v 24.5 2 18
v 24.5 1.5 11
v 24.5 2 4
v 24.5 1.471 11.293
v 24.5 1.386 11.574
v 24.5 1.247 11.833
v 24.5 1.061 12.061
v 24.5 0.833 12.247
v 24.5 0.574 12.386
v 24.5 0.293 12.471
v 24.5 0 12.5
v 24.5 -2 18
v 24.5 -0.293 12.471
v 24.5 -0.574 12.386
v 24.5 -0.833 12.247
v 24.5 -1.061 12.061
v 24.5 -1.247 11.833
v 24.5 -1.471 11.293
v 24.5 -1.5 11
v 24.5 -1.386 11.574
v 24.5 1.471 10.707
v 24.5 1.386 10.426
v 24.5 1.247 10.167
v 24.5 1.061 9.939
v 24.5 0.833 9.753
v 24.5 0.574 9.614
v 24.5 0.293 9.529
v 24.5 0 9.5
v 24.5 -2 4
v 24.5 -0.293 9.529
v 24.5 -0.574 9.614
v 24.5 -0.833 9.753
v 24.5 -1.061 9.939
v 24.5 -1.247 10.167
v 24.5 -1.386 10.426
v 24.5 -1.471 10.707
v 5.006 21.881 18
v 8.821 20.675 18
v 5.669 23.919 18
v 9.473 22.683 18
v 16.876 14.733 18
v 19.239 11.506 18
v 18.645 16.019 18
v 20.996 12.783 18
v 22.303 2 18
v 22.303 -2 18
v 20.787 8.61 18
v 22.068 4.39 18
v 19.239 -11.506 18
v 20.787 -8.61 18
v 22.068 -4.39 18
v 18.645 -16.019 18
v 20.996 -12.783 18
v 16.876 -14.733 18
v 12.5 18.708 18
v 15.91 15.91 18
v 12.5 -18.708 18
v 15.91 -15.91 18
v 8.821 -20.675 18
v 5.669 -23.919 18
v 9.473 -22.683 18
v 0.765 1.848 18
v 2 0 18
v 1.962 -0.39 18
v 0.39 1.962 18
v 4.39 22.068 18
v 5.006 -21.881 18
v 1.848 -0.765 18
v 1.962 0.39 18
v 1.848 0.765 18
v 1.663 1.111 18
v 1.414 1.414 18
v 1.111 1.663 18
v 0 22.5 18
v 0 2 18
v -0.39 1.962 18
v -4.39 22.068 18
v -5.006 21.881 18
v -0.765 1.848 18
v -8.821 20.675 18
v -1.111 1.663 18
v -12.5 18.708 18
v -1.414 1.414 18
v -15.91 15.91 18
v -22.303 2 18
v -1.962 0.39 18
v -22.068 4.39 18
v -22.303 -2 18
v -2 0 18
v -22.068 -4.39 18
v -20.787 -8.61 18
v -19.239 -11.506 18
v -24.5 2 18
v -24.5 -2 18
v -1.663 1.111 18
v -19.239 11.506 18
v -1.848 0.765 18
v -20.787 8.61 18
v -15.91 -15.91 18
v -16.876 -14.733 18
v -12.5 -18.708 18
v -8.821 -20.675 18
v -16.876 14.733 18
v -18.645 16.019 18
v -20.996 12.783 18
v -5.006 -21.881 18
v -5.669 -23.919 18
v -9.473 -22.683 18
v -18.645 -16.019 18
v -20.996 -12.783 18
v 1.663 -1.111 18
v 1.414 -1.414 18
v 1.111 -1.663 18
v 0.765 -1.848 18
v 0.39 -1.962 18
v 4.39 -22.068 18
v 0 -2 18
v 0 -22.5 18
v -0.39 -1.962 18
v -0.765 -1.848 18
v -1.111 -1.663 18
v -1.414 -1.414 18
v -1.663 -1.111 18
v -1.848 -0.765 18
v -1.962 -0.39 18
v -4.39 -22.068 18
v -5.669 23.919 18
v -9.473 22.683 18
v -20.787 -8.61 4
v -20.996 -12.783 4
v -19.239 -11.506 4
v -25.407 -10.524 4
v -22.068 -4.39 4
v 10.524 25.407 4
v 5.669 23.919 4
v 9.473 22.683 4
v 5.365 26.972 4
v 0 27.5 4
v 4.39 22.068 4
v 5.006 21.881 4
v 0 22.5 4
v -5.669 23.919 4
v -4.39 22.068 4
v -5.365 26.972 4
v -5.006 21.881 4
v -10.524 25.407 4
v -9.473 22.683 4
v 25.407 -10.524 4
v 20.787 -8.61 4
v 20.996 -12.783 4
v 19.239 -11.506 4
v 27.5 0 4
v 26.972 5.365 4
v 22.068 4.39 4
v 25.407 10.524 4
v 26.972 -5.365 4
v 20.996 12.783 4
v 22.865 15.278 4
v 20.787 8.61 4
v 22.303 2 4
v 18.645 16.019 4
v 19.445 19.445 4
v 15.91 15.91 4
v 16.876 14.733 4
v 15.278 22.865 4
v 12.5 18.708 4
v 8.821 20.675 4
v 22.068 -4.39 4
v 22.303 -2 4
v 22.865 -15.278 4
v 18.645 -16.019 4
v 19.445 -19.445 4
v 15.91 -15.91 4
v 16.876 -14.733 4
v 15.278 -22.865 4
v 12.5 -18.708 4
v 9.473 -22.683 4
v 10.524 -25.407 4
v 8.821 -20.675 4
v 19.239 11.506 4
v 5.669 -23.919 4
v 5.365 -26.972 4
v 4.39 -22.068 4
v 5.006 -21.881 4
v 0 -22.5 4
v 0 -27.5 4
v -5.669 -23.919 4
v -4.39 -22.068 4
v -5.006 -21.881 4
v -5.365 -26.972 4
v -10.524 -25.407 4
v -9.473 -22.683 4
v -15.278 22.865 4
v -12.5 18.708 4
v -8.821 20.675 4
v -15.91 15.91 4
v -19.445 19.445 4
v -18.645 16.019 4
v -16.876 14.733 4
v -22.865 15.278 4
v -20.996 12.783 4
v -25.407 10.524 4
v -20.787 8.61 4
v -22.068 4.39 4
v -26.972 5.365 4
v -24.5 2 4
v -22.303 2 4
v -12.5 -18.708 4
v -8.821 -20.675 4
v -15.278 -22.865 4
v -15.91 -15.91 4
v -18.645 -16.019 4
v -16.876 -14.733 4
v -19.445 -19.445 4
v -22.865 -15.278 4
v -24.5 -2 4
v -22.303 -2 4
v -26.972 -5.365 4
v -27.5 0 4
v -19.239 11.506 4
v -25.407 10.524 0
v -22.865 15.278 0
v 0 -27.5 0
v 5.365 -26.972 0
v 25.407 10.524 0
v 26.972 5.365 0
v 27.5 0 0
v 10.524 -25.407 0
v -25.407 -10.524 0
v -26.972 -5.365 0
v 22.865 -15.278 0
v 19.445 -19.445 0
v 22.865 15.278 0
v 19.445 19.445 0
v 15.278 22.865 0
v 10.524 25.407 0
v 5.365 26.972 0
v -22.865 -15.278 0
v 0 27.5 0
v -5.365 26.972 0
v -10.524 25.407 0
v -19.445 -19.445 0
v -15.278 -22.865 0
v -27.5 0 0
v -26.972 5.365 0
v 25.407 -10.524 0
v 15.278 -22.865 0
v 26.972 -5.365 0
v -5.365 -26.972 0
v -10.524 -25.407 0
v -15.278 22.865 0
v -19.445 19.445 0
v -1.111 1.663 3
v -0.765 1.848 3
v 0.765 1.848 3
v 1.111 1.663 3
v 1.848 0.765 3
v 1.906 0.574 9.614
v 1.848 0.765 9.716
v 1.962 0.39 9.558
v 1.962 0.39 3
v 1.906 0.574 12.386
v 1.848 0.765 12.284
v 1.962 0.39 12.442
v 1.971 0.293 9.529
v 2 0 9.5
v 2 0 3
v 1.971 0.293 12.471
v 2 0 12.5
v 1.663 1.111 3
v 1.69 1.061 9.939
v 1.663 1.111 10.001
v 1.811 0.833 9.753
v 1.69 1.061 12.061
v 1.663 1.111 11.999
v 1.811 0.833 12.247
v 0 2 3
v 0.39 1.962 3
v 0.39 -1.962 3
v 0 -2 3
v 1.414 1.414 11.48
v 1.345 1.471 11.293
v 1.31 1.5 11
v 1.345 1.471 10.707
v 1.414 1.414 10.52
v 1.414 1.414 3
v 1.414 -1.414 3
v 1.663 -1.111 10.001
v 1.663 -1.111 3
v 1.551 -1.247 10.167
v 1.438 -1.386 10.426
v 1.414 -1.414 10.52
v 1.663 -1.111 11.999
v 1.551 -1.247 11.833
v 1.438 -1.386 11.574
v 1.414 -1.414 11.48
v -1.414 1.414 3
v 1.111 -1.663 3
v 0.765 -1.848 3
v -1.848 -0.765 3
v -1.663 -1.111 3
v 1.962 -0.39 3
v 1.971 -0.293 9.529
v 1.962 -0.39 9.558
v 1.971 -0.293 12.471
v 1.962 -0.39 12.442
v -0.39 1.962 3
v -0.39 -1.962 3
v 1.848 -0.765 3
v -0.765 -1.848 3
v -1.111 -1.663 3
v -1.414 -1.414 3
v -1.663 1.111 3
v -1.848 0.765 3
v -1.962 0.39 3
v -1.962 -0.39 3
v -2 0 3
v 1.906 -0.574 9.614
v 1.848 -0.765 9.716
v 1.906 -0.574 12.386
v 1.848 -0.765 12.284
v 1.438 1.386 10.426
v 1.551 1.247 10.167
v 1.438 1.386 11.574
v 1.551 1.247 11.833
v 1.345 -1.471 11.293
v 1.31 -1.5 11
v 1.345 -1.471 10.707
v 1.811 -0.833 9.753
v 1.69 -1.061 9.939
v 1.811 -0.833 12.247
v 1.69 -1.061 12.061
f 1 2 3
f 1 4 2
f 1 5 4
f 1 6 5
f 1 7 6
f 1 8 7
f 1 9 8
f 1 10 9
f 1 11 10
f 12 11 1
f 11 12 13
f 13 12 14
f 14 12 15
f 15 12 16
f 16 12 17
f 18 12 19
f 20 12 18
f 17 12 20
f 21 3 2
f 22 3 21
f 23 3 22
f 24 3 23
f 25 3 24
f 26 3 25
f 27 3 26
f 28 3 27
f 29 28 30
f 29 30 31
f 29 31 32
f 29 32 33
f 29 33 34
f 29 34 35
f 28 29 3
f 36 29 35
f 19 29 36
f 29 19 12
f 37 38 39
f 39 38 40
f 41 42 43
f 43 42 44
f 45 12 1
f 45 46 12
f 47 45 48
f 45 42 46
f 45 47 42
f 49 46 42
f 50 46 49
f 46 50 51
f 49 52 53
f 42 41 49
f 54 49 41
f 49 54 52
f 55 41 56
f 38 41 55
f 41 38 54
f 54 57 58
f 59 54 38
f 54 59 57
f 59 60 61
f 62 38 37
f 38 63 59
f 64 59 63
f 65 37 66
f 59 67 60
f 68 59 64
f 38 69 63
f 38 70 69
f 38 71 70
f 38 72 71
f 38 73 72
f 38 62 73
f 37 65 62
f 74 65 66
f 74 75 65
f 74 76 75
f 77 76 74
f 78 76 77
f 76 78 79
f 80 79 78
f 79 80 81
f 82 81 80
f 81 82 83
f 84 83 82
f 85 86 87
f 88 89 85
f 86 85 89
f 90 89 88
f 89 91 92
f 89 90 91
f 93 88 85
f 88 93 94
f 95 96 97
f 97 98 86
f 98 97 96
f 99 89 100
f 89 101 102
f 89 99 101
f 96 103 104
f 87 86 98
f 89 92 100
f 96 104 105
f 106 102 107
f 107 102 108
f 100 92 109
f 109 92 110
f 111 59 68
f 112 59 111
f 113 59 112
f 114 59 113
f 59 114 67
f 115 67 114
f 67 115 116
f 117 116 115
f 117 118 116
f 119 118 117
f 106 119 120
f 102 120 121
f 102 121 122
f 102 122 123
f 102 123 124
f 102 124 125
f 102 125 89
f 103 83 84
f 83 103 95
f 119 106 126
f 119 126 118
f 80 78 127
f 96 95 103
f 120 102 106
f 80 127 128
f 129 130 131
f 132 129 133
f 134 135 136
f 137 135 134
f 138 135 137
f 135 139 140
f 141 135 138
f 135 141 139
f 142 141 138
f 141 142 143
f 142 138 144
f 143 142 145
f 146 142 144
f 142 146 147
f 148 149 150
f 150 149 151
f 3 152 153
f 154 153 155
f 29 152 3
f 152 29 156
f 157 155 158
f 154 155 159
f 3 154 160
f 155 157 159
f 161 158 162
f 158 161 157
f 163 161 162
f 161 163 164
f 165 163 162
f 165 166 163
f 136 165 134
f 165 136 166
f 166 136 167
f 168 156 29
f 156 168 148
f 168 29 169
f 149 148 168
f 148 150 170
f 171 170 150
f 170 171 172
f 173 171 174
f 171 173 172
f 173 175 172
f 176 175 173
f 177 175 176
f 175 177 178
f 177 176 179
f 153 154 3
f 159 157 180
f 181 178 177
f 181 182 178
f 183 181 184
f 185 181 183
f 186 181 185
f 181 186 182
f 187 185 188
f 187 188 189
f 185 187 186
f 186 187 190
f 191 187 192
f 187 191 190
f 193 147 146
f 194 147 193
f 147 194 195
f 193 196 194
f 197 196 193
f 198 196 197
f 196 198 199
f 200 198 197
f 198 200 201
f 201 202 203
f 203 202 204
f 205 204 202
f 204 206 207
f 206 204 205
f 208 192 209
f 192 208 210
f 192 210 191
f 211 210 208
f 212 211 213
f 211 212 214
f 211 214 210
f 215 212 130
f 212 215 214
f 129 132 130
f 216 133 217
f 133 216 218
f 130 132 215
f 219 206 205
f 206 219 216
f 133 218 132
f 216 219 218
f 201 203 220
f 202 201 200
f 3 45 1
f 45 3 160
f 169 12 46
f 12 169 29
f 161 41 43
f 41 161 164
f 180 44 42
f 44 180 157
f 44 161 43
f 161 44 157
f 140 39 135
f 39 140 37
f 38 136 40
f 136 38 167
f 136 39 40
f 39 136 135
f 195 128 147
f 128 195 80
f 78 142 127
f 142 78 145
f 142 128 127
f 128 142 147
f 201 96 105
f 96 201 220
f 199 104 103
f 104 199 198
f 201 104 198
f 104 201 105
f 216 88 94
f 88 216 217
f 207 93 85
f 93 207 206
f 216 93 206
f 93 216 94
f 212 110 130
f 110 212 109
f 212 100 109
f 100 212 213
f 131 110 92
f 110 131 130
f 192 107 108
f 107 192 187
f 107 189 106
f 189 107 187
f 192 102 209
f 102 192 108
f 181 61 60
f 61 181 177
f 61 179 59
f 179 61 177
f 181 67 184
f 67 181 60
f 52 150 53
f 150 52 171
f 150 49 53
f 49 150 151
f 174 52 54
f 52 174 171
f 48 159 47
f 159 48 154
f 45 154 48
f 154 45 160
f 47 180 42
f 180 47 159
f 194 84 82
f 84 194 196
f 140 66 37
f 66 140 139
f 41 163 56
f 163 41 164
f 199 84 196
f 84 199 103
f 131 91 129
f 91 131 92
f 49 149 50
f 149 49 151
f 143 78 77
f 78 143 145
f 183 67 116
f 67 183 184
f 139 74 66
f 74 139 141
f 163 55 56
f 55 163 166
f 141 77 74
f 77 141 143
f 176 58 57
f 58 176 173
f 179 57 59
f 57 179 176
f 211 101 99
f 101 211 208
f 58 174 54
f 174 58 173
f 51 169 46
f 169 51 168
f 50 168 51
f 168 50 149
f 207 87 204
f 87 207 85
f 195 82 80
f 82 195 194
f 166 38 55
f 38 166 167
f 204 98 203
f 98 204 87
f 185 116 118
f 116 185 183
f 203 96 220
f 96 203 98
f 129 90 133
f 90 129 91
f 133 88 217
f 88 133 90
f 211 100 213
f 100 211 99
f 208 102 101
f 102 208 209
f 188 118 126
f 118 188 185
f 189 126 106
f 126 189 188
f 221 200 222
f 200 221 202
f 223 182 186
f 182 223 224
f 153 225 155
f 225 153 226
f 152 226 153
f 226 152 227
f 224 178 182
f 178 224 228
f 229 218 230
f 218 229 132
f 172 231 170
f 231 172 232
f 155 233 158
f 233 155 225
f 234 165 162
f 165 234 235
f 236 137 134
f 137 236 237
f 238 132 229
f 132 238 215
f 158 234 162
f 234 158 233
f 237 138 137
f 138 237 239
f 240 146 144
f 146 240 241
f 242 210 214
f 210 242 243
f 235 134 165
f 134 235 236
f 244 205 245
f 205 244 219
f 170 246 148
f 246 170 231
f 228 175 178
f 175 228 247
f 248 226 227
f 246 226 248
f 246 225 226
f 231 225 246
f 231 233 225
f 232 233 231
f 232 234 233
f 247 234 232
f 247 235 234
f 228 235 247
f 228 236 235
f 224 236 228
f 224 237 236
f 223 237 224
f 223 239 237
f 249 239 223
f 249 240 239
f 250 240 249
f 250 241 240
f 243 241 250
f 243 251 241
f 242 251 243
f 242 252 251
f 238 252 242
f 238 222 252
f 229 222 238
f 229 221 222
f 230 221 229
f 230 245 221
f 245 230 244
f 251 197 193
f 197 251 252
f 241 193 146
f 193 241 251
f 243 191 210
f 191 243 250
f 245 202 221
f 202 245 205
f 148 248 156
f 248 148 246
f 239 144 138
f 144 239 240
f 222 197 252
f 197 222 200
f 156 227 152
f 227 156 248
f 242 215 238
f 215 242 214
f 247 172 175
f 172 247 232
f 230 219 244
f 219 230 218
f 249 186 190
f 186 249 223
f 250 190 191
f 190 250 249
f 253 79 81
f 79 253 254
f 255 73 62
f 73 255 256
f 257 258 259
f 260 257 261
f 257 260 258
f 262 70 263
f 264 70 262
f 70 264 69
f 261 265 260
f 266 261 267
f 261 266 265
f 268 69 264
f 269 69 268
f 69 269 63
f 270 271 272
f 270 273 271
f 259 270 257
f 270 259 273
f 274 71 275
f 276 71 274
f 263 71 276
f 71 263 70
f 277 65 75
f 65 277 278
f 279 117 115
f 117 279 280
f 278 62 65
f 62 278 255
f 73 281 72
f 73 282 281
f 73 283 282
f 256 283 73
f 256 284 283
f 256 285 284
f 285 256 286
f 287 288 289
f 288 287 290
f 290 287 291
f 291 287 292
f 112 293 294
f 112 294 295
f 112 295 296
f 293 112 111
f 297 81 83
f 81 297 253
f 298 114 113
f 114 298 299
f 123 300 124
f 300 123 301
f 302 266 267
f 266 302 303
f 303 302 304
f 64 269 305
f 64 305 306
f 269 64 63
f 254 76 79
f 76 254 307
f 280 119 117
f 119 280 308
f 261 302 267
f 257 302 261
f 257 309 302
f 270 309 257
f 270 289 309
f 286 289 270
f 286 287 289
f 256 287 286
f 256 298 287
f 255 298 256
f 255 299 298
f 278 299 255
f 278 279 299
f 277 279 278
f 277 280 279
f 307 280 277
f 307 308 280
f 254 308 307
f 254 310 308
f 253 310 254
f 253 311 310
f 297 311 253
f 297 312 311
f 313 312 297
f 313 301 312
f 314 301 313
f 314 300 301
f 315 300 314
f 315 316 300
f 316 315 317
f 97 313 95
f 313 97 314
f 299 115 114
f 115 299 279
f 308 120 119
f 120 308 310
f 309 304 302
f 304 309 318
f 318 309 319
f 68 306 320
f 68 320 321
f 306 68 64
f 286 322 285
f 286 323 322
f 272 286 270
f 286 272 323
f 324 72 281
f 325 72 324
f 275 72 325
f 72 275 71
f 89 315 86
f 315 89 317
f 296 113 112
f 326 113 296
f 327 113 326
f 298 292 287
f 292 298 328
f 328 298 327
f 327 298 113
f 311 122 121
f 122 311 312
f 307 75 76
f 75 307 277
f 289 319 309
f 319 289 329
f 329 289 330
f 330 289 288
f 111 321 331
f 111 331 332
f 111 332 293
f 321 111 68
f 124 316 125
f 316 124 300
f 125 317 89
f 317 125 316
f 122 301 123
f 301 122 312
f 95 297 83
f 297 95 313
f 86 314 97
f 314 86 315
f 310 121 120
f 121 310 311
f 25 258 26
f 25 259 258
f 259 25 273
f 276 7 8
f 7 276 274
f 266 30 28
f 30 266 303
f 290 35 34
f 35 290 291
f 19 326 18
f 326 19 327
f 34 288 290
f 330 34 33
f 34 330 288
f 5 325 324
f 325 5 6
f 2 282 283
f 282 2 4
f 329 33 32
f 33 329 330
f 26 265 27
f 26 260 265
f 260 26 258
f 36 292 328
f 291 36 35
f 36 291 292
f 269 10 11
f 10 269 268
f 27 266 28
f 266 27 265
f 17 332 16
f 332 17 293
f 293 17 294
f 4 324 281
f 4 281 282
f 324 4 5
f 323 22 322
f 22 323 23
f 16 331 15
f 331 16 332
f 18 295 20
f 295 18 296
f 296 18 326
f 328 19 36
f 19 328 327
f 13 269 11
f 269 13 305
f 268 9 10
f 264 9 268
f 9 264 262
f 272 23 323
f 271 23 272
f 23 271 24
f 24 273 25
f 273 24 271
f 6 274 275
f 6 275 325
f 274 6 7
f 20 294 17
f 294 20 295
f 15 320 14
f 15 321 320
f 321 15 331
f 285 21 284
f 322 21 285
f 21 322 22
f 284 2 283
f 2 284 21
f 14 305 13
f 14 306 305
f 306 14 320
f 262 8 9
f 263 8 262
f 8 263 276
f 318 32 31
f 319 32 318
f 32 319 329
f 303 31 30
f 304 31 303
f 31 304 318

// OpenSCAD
$fn = 32;

// ----------------------------------------------------------------------
// Control knob: skirt knob with grip ribs
// ----------------------------------------------------------------------

// --- parameters (mm) ---
skirt_d = 55;             // skirt diameter
skirt_t = 4;              // skirt thickness
rib_w = 4;                // grip rib width
rib_out = 3;              // grip rib radial protrusion
n_ribs = 10;              // number of grip ribs
knob_d = 45;              // knob body diameter
knob_h = 14;              // knob body height
bore_d = 4;               // shaft bore diameter
set_d = 3;                // set screw bore diameter

rib_step = 360 / n_ribs;  // rib angular step
total_h = skirt_t + knob_h;  // overall height

difference() {
  union() {
    translate([0, 0, skirt_t]) cylinder(h = knob_h, d = knob_d);
    cylinder(h = skirt_t, d = skirt_d);
    for (i = [0 : n_ribs - 1])
      rotate([0, 0, i * rib_step])
        translate([knob_d / 2 - 1, -rib_w / 2, skirt_t])
          cube([rib_out, rib_w, knob_h]);
  }
  translate([0, 0, skirt_t - 1]) cylinder(h = knob_h + 2, d = bore_d);
  translate([-1, 0, skirt_t + knob_h / 2]) rotate([0, 90, 0])
    cylinder(h = knob_d / 2 + bore_d / 2 + 2, d = set_d);
}
